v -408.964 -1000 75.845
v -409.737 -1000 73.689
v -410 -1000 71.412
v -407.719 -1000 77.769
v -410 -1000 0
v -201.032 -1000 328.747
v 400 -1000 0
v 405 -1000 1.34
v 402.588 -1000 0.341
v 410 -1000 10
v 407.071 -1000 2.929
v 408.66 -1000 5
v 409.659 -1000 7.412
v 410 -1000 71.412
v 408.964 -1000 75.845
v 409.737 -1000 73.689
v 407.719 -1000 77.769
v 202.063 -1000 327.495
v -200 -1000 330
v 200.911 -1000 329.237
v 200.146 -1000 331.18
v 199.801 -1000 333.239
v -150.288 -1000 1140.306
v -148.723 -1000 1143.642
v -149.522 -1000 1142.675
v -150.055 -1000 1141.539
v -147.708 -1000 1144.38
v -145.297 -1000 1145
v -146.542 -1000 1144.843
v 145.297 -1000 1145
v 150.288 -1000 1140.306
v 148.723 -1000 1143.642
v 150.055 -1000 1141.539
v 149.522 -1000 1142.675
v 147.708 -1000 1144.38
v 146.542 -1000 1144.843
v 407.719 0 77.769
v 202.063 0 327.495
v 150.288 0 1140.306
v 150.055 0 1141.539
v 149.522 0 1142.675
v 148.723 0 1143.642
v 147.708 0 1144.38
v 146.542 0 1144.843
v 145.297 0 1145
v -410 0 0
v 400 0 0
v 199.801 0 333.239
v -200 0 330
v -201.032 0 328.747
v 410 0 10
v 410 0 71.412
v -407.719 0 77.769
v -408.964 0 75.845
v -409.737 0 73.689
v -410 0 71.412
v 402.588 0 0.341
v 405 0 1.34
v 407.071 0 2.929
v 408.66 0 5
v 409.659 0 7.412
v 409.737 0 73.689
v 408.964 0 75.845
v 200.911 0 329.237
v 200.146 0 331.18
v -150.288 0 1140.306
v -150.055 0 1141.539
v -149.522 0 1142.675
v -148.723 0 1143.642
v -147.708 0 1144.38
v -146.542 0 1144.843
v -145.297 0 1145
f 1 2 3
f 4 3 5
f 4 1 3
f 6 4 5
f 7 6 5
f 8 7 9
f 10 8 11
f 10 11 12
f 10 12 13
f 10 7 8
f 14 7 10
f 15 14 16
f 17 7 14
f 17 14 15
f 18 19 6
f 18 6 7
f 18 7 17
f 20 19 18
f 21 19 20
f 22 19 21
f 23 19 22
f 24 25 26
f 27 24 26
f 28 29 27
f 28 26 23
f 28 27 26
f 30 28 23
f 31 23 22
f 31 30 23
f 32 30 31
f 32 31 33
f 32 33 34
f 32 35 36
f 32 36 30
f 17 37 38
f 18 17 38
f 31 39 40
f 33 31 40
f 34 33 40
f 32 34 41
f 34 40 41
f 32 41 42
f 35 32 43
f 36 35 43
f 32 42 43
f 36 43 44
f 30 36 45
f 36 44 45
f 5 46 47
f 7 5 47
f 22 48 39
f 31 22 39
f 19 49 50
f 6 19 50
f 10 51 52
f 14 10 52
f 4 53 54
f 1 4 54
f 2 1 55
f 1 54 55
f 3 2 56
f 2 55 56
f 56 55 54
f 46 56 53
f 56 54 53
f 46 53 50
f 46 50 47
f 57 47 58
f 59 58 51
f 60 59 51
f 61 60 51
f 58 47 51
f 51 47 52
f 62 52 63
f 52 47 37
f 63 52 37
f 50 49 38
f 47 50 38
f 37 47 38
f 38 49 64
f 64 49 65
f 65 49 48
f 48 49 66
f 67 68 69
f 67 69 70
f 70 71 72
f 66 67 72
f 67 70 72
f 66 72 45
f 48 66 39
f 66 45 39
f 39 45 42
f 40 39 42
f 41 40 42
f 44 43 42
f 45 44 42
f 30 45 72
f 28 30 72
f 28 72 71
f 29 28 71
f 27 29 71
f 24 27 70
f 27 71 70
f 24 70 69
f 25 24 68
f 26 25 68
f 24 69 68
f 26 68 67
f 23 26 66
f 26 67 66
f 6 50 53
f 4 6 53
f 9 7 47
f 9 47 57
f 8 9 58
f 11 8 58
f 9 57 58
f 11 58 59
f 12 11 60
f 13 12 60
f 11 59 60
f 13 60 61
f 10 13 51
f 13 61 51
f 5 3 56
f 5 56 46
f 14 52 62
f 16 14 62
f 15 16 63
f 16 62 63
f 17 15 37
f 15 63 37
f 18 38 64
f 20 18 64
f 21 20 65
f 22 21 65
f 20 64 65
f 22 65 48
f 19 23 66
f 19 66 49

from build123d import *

# Parameters (mm, degrees)
F1_DEPTH = 1000


with BuildPart() as f1:
    # F0 (on Front) → F1 (new body)
    with BuildSketch(Plane.XZ):
        with BuildLine():
            Line((-410, 0), (0, 0))
            Line((0, 0), (400, 0))
            ThreePointArc((400, 0), (407.071068, 2.928932), (410, 10))
            Line((410, 10), (410, 71.412346))
            ThreePointArc((410, 71.412346), (409.412572, 74.789251), (407.719302, 77.769419))
            Line((407.719302, 77.769419), (202.063194, 327.494693))
            ThreePointArc((202.063194, 327.494693), (200.477782, 330.188122), (199.801263, 333.23942))
            Line((199.801263, 333.23942), (150.287965, 1140.306173))
            ThreePointArc((150.287965, 1140.306173), (148.722923, 1143.642174), (145.297348, 1145))
            Line((145.297348, 1145), (0, 1145))
            Line((0, 1145), (-145.297348, 1145))
            ThreePointArc((-145.297348, 1145), (-148.722923, 1143.642174), (-150.287965, 1140.306173))
            Line((-150.287965, 1140.306173), (-200, 330))
            Line((-200, 330), (-201.031597, 328.747346))
            Line((-201.031597, 328.747346), (-407.719302, 77.769419))
            ThreePointArc((-407.719302, 77.769419), (-409.412572, 74.789251), (-410, 71.412346))
            Line((-410, 71.412346), (-410, 0))
        make_face()
    extrude(amount=F1_DEPTH)


solid = f1.part
